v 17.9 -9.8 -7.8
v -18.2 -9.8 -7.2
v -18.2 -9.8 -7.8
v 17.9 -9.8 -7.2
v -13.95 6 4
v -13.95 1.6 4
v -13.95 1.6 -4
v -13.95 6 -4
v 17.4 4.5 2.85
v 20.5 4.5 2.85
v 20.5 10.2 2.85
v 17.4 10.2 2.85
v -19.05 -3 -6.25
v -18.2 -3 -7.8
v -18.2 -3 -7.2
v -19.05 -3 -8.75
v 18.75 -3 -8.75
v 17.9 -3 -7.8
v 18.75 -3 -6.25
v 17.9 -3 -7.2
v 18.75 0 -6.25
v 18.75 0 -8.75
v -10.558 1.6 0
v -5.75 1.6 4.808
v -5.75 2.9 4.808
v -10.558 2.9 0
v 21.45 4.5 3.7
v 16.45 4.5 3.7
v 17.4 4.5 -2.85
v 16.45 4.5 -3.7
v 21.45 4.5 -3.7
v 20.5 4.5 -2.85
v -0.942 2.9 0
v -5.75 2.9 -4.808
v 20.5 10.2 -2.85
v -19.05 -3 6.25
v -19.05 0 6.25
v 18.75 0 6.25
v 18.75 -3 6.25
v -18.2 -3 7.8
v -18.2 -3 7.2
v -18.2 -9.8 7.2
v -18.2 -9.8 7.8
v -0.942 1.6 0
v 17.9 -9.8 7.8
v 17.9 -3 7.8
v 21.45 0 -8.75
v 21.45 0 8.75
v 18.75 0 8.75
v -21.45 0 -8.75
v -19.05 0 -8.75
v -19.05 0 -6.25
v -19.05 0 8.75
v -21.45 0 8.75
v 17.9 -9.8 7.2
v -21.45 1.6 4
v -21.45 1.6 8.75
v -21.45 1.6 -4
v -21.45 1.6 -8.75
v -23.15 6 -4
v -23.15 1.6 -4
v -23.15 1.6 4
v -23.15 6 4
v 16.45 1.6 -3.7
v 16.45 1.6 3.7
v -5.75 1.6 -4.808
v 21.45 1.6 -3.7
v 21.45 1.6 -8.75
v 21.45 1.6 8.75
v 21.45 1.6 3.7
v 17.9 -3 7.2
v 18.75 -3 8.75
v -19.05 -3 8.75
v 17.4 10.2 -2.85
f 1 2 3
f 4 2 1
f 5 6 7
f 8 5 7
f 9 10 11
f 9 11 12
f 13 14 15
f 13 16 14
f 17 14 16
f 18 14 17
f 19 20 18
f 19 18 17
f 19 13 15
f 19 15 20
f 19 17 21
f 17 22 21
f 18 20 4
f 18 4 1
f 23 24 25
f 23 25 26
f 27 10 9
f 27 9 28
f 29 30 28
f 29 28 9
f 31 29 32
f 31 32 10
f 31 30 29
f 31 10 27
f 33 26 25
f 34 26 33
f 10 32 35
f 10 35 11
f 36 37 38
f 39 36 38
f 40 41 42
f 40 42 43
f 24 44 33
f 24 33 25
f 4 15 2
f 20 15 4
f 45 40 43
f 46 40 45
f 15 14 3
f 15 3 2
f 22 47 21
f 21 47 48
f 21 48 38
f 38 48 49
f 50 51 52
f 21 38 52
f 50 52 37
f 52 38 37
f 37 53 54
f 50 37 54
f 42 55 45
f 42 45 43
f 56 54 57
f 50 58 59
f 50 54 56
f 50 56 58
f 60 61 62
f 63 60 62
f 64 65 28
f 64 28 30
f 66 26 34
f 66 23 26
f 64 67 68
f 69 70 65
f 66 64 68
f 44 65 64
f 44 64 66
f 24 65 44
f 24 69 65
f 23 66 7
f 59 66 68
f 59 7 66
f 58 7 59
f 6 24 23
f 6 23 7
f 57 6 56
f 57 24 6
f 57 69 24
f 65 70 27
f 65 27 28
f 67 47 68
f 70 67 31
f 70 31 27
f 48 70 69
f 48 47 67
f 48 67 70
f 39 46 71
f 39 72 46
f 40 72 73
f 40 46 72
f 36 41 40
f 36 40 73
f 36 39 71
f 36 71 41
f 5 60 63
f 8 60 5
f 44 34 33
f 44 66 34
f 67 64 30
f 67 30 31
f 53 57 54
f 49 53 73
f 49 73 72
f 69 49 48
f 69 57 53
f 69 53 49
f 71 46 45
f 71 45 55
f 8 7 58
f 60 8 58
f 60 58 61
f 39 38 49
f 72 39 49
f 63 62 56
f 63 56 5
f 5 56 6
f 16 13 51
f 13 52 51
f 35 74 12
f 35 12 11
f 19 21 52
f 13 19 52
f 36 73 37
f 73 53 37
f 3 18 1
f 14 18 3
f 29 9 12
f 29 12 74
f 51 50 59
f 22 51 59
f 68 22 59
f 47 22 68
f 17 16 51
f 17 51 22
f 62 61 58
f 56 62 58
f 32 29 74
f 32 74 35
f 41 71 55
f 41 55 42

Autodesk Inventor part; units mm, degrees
ref_plane "YZ Plane" through (0, 0, 0) normal (1, 0, 0) x (0, 1, 0)
ref_plane "XZ Plane" through (0, 0, 0) normal (0, 1, 0) x (-1, 0, 0)
sketch "Sketch1" plane through (0, 0, 0) normal (0, 1, 0) x (-1, 0, 0)
  line L0 (-21.45, 8.75) -> (21.45, 8.75)
  line L1 (21.45, 8.75) -> (21.45, -8.75)
  line L2 (21.45, -8.75) -> (-21.45, -8.75)
  line L3 (-21.45, -8.75) -> (-21.45, 8.75)
  line L4 (-21.45, 8.75) -> (21.45, -8.75) construction
  line L5 (21.45, 8.75) -> (-21.45, -8.75) construction
  point P0 (0, 0)
  dimension "d0" = 42.9
  dimension "d1" = 17.5
extrude "Extrusion1" add sketch "Sketch1" along normal blind 1.6
sketch "Sketch2" plane through (0, 0, 0) normal (0, -1, 0) x (1, 0, 0)
  line L0 (21.45, -8.75) -> (-21.45, -8.75) projected
  line L1 (-21.45, -8.75) -> (-19.05, -8.75)
  line L2 (-19.05, -8.75) -> (18.75, -8.75)
  line L3 (18.75, -8.75) -> (18.75, -6.25)
  line L4 (18.75, -6.25) -> (-19.05, -6.25)
  line L5 (-19.05, -6.25) -> (-19.05, -8.75)
  point P0 (0, 0)
  dimension "d4" = 2.4
  dimension "d5" = 37.8
  dimension "d6" = 2.5
extrude "Extrusion2" add sketch "Sketch2" along normal blind 3
ref_plane "Work Plane1" through (21.45, 1.6, 0) normal (0, 0, -1) x (-1, 0, 0)
sketch "Sketch3" plane through (0, -3, 0) normal (0, -1, 0) x (1, 0, 0)
  line L0 (18.75, -6.25) -> (-19.05, -6.25) projected
  line L1 (-19.05, -8.75) -> (18.75, -8.75) projected
  line L2 (18.75, -6.25) -> (-19.05, -8.75)
  line L3 (18.75, -8.75) -> (-19.05, -6.25)
  line L4 (-18.2, -7.2) -> (17.9, -7.2)
  line L5 (17.9, -7.2) -> (17.9, -7.8)
  line L6 (17.9, -7.8) -> (-18.2, -7.8)
  line L7 (-18.2, -7.8) -> (-18.2, -7.2)
  line L8 (-18.2, -7.2) -> (17.9, -7.8) construction
  line L9 (17.9, -7.2) -> (-18.2, -7.8) construction
  point P0 (0, 0)
  point P1 (-0.15, -7.5)
  dimension "d10" = 36.1
  dimension "d11" = 0.6
extrude "Extrusion3" add sketch "Sketch3" along normal blind 6.8 contours L4 L5 L6 L3 L2 | L2 L3 L4 | L3 L2 L6 L7 L4 | L3 L6 L2
mirror "Mirror1" about plane through (21.45, 1.6, 0) normal (0, 0, -1) of "Extrusion3", "Extrusion2"
sketch "Sketch4" plane through (0, 1.6, 0) normal (0, 1, 0) x (1, 0, 0)
  line L0 (-21.45, 8.75) -> (-21.45, -8.75) projected
  line L1 (-10.5583, 0) -> (-5.75, 4.8083)
  line L2 (-5.75, 4.8083) -> (-0.9417, 0)
  line L3 (-0.9417, 0) -> (-5.75, -4.8083)
  line L4 (-5.75, -4.8083) -> (-10.5583, 0)
  point P0 (0, 0)
  point P1 (-5.75, 0)
  dimension "d15" = 6.8
extrude "Extrusion4" add sketch "Sketch4" along normal blind 1.3
sketch "Sketch5" plane through (0, 1.6, 0) normal (0, 1, 0) x (1, 0, 0)
  line L0 (21.45, -8.75) -> (21.45, 8.75) projected
  line L1 (21.45, -3.7) -> (16.45, -3.7)
  line L2 (16.45, -3.7) -> (16.45, 3.7)
  line L3 (16.45, 3.7) -> (21.45, 3.7)
  line L4 (21.45, 3.7) -> (21.45, -3.7)
  line L5 (21.45, -3.7) -> (16.45, 3.7) construction
  line L6 (16.45, -3.7) -> (21.45, 3.7) construction
  point P0 (0, 0)
  dimension "d19" = 5
  dimension "d20" = 7.4
extrude "Extrusion5" add sketch "Sketch5" along normal blind 2.9
sketch "Sketch6" plane through (0, 4.5, 0) normal (0, 1, 0) x (1, 0, 0)
  line L0 (16.45, -3.7) -> (21.45, -3.7) projected
  line L1 (21.45, -8.75) -> (21.45, 8.75) projected
  line L2 (21.45, 3.7) -> (16.45, 3.7) projected
  line L3 (20.5, -2.85) -> (17.4, -2.85)
  line L4 (17.4, -2.85) -> (17.4, 2.85)
  line L5 (17.4, 2.85) -> (20.5, 2.85)
  line L6 (20.5, 2.85) -> (20.5, -2.85)
  line L7 (20.5, -2.85) -> (17.4, 2.85) construction
  line L8 (17.4, -2.85) -> (20.5, 2.85) construction
  point P0 (0, 0)
  point P1 (18.95, 0)
  dimension "d23" = 3.1
  dimension "d24" = 5.7
extrude "Extrusion6" add sketch "Sketch6" along normal blind 5.7
sketch "Sketch7" plane through (0, 1.6, 0) normal (0, 1, 0) x (1, 0, 0)
  line L0 (-21.45, 8.75) -> (-21.45, -8.75) projected
  line L1 (-13.95, 4) -> (-23.15, 4)
  line L2 (-23.15, 4) -> (-23.15, -4)
  line L3 (-23.15, -4) -> (-13.95, -4)
  line L4 (-13.95, -4) -> (-13.95, 4)
  point P0 (0, 0)
  dimension "d29" = 9.2
  dimension "d30" = 8
extrude "Extrusion7" add sketch "Sketch7" along normal blind 4.4
properties part number "Arduino"
